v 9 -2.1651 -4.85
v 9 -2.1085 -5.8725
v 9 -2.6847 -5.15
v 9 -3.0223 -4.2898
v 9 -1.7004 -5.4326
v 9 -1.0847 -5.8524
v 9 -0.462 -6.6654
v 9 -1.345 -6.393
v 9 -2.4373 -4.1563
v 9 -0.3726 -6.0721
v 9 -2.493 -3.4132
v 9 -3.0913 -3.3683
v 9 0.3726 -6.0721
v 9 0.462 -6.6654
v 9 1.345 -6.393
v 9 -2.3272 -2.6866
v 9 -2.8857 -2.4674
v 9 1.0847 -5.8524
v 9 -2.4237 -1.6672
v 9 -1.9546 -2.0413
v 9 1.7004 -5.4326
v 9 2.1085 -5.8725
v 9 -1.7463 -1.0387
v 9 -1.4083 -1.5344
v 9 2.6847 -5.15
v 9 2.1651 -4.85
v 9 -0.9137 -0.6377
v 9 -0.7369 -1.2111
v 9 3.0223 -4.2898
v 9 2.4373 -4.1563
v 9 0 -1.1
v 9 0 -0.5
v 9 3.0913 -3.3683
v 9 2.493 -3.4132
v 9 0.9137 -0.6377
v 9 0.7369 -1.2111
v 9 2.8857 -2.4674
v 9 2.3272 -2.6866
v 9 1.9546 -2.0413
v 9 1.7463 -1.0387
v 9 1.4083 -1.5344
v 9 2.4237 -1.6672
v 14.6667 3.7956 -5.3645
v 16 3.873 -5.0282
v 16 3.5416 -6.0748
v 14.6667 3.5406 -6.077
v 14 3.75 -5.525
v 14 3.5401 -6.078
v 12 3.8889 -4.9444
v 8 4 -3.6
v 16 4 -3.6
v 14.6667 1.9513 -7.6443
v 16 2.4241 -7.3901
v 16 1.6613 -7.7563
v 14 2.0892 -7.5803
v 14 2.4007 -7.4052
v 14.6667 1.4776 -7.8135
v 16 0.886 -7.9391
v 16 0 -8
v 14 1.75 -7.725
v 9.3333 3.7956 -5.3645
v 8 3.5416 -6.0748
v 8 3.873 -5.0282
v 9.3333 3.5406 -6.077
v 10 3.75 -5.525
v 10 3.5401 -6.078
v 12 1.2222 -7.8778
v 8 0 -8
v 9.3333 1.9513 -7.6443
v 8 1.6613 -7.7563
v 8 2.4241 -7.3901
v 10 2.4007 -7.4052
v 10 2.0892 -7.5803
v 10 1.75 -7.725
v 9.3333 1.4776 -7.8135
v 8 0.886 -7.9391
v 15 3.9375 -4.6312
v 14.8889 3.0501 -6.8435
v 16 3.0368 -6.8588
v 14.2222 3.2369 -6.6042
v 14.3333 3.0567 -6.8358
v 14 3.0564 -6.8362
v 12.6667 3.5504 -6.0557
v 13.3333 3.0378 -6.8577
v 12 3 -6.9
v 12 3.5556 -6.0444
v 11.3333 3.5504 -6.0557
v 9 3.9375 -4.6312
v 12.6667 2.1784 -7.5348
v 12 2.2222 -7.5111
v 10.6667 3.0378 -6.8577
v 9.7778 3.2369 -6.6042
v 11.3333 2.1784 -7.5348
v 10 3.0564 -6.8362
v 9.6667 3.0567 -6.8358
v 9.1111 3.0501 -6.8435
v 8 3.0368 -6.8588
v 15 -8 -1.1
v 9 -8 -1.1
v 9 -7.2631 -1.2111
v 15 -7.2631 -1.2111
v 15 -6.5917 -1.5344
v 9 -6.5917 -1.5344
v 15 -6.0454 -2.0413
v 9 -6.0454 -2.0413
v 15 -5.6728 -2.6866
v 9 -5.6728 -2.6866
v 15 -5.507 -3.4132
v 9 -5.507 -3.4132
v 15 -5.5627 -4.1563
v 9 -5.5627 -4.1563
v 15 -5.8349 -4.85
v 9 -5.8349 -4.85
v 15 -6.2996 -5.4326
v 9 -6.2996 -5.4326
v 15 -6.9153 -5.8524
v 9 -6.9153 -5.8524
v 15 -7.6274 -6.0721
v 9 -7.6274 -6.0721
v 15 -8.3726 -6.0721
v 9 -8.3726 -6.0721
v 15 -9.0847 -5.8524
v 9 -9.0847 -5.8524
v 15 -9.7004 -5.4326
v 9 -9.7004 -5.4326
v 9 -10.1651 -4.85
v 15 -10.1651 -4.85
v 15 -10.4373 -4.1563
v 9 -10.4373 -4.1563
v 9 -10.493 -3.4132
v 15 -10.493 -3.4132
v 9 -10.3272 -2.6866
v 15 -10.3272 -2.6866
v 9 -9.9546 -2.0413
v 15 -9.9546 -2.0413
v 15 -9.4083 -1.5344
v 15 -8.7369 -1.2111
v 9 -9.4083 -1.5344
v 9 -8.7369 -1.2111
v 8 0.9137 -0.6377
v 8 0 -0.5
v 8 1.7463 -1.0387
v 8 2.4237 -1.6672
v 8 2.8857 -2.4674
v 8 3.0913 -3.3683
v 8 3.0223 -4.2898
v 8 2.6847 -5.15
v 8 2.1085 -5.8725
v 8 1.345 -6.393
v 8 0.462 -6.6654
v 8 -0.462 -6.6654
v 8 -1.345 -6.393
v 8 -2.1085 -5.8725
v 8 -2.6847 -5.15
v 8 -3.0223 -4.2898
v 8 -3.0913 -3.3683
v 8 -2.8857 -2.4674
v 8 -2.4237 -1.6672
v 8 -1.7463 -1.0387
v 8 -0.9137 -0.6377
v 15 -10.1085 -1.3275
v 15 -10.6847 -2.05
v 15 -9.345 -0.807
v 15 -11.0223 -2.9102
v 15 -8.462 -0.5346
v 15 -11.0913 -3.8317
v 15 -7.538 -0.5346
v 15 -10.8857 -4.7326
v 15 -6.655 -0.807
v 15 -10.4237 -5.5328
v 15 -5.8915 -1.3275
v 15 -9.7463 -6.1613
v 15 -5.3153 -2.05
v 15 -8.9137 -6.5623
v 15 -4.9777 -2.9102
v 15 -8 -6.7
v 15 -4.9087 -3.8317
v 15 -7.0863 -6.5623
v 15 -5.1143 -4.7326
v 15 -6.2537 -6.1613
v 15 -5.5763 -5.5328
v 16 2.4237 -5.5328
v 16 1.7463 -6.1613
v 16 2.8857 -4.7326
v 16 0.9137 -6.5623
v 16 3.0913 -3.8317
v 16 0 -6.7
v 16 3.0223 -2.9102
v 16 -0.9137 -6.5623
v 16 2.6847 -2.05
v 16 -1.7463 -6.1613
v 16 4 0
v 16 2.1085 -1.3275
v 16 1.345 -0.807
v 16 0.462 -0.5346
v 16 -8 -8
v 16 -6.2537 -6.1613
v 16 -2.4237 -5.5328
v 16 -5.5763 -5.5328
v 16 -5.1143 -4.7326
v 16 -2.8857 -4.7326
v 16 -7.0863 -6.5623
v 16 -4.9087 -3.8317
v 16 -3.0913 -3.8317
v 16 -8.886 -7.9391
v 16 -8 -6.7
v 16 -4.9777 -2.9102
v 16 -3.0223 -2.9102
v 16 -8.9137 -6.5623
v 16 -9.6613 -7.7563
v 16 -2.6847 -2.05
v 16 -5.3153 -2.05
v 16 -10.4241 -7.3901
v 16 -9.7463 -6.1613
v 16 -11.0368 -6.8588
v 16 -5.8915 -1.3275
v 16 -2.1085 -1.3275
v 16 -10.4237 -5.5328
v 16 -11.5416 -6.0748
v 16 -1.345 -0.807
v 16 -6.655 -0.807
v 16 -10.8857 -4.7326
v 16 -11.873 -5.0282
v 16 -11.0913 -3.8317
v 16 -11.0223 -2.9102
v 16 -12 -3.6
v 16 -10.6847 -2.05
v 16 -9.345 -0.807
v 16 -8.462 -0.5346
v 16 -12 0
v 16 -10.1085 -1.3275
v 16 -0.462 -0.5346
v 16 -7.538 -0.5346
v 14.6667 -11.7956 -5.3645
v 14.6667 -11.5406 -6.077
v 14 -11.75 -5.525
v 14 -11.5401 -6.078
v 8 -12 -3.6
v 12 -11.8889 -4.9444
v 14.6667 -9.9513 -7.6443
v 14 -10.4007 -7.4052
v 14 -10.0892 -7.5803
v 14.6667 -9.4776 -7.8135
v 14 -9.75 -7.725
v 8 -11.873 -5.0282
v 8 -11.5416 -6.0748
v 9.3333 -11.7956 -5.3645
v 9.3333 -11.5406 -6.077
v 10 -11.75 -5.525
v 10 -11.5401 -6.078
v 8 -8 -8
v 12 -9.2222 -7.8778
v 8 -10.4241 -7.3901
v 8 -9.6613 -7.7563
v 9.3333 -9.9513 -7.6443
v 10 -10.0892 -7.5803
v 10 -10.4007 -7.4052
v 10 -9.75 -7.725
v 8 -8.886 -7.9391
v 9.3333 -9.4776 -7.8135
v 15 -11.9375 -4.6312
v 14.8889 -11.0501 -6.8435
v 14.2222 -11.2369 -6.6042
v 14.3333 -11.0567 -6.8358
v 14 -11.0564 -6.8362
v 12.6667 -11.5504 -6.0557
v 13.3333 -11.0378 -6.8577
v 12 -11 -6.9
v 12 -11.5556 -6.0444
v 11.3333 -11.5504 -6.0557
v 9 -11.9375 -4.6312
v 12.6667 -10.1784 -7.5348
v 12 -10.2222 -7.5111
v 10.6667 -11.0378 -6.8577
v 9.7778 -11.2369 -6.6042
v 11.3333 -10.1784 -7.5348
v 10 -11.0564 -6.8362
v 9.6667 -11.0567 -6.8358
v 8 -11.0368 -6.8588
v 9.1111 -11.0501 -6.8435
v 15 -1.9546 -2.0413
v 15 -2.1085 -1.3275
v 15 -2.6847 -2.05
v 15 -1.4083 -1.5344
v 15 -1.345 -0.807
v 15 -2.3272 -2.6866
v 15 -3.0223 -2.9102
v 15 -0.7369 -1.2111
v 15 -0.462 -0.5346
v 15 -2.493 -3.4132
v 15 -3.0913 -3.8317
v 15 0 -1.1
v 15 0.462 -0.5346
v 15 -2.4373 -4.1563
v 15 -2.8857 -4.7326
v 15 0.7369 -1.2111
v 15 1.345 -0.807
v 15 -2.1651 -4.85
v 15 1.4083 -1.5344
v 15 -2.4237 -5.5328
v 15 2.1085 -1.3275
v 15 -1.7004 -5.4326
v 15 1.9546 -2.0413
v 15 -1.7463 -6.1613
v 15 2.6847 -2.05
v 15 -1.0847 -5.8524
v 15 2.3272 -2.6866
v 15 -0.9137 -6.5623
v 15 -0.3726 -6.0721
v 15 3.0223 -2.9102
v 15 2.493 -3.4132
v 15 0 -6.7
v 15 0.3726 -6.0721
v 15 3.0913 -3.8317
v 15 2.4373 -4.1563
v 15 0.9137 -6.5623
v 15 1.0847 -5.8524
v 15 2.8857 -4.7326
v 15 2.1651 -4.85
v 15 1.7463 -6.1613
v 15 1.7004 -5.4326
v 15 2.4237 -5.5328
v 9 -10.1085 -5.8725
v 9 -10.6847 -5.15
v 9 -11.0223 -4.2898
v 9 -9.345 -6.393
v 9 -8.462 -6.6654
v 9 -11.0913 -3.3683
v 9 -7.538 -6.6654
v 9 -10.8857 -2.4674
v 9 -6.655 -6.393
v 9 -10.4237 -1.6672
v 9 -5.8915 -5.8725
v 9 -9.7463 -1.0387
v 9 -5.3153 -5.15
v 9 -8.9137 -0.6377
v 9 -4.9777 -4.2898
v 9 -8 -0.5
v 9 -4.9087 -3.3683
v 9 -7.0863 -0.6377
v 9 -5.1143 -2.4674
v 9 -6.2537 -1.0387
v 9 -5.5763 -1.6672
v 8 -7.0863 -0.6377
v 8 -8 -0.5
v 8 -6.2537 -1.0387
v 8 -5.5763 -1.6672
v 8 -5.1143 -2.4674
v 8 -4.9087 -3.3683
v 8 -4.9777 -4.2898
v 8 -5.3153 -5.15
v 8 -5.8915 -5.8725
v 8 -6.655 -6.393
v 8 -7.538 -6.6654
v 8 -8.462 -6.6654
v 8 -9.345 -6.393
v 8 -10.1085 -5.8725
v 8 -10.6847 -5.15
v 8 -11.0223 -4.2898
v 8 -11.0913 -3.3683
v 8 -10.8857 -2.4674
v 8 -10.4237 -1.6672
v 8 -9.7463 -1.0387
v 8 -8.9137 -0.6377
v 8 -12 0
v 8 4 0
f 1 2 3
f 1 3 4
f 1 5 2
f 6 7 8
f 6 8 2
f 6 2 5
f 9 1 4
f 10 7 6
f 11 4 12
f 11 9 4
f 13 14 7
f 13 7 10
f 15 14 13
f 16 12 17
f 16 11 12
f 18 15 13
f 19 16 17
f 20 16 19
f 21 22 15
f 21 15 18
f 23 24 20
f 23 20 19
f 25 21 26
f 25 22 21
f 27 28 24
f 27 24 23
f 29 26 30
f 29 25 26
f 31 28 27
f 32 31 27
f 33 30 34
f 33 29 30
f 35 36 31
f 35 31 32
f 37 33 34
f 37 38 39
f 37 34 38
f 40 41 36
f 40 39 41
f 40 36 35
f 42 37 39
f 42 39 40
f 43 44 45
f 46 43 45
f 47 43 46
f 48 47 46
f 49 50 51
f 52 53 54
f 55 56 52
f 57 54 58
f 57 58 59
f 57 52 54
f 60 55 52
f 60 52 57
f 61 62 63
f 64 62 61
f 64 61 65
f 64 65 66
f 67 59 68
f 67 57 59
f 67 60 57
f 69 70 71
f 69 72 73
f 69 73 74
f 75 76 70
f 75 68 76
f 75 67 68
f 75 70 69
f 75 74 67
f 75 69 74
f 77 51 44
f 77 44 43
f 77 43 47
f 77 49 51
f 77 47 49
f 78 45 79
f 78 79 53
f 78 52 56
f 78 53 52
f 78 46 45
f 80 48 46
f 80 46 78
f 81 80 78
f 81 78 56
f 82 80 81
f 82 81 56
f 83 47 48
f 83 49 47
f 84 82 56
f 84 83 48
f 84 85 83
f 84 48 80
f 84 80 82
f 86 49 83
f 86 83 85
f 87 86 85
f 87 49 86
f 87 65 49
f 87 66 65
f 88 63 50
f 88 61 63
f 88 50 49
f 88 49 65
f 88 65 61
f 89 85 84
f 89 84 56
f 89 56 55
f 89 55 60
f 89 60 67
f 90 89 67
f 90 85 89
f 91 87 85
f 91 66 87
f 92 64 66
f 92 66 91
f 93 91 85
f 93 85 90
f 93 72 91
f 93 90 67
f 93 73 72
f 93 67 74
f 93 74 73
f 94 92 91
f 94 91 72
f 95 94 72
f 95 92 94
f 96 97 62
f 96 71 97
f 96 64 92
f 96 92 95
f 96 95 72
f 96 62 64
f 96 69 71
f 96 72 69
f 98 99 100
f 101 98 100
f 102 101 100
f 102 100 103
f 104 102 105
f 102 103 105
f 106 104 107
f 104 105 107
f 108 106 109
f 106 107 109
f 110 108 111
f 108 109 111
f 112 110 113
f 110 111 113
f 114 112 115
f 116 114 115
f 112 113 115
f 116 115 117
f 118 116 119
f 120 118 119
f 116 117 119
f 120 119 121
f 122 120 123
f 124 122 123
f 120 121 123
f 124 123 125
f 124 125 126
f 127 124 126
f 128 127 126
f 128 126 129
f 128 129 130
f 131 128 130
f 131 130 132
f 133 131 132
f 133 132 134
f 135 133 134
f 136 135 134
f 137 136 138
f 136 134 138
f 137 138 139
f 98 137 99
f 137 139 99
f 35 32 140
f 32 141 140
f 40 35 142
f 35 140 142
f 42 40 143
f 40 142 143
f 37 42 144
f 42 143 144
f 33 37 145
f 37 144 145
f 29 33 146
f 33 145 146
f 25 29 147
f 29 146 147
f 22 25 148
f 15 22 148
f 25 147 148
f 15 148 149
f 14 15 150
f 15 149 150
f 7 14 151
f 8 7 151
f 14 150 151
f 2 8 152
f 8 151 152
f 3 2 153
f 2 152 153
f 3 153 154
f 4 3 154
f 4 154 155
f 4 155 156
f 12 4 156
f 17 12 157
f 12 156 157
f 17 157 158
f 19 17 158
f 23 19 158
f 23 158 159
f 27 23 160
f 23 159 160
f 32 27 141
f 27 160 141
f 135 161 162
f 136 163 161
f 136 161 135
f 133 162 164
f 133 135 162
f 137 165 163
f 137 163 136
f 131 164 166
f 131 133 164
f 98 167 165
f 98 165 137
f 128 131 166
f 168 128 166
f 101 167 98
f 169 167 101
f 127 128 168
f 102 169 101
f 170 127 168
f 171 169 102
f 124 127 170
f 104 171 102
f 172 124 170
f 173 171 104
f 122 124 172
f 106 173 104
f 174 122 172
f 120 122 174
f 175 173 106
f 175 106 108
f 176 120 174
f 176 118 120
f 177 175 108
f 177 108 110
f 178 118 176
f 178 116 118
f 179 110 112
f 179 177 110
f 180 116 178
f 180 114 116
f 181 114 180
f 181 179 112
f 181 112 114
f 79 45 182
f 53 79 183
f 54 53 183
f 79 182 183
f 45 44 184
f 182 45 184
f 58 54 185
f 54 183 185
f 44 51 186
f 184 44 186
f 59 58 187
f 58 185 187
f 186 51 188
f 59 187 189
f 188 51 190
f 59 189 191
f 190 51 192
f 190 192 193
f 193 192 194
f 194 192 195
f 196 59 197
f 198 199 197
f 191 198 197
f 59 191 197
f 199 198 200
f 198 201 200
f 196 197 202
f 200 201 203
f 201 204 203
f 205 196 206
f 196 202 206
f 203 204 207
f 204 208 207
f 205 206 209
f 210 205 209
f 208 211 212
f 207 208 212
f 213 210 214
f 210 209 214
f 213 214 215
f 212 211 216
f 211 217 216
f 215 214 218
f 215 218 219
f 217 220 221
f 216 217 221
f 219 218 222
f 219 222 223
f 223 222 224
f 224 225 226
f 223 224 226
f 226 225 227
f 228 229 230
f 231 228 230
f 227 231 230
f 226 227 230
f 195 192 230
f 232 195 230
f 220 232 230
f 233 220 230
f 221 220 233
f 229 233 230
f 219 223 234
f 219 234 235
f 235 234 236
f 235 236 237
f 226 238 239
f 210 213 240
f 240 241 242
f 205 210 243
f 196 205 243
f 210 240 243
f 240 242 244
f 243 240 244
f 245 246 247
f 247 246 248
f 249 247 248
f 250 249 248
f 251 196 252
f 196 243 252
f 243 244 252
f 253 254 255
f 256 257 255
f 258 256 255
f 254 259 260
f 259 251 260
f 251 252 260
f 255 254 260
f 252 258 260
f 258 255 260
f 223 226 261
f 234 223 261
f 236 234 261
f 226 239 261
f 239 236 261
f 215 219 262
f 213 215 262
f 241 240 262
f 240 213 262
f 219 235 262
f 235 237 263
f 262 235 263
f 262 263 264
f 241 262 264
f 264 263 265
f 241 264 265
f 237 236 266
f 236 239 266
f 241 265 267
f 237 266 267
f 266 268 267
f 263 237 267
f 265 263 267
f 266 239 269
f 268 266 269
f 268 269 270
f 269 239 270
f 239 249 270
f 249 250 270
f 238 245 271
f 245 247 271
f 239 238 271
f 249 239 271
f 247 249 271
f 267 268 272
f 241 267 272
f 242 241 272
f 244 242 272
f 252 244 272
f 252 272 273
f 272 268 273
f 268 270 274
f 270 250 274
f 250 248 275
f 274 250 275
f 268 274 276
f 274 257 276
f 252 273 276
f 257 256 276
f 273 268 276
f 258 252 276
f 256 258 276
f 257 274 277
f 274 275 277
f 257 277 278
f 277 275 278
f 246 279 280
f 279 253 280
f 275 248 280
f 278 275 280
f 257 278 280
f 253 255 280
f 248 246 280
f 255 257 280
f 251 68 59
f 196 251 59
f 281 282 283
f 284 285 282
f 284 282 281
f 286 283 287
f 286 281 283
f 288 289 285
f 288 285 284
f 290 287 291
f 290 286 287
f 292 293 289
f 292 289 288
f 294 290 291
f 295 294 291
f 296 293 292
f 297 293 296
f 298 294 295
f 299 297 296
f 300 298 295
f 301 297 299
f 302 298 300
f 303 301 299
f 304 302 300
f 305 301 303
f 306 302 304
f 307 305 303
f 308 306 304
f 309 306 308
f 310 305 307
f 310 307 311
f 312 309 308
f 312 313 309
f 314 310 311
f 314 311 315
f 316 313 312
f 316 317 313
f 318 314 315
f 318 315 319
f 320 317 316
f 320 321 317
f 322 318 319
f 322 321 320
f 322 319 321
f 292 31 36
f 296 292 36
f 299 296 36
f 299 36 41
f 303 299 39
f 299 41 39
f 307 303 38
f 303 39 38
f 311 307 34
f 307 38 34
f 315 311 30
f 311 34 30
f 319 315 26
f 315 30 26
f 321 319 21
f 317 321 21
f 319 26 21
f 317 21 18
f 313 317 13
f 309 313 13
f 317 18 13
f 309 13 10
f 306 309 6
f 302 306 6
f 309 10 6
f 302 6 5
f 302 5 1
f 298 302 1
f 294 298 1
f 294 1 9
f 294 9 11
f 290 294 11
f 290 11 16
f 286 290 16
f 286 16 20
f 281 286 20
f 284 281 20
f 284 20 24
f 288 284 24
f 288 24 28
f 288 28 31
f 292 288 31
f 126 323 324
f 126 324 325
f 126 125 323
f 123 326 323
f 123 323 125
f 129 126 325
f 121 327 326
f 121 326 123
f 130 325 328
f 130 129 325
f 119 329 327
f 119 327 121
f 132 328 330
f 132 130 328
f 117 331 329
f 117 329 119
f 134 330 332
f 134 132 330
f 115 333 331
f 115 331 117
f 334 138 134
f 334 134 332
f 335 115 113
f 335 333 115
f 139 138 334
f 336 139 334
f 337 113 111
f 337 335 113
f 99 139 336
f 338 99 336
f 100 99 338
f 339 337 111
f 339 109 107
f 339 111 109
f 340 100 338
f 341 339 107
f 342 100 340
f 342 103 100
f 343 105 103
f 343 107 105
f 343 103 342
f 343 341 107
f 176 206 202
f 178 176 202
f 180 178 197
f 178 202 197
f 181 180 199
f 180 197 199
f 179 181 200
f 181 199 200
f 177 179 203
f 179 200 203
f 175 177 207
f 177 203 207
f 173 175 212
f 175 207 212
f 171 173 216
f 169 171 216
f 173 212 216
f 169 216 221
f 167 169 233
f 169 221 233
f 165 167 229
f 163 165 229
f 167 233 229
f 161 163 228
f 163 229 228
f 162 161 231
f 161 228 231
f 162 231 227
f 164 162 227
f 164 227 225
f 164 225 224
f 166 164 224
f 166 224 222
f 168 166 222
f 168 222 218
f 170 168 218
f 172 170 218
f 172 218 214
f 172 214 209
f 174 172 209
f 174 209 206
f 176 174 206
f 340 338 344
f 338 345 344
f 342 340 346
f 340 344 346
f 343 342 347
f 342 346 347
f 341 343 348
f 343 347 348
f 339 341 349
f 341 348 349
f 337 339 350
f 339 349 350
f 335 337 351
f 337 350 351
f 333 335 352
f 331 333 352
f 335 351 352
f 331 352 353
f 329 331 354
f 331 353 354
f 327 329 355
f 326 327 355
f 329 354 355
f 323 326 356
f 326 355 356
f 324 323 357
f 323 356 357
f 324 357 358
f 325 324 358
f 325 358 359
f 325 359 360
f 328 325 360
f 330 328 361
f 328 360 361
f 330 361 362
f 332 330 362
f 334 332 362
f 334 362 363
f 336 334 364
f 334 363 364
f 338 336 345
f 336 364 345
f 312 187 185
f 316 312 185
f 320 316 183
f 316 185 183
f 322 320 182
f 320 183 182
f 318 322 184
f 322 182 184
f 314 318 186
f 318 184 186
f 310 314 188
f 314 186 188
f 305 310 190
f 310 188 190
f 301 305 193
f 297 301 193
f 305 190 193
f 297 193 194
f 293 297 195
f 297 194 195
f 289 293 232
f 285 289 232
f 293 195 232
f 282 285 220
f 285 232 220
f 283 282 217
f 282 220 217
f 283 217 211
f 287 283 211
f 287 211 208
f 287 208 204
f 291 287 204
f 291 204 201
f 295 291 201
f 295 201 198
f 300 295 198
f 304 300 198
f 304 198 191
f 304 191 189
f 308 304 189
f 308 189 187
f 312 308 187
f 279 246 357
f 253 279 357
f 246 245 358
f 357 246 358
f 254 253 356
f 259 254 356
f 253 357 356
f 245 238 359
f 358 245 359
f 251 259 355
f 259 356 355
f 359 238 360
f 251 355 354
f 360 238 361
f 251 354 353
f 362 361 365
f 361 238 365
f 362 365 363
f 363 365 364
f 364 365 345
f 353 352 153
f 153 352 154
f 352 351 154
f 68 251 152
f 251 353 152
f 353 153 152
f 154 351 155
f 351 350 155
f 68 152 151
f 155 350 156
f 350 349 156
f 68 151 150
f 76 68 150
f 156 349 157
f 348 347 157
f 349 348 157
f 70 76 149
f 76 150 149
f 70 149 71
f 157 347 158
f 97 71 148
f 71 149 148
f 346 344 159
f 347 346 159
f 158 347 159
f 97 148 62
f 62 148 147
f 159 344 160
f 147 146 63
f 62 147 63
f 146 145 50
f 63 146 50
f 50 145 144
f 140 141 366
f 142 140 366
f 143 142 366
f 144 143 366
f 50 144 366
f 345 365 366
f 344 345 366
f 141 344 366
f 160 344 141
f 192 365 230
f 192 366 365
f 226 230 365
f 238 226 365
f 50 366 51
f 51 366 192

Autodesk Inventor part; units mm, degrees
ref_plane "YZ Plane" through (0, 0, 0) normal (1, 0, 0) x (0, 1, 0)
ref_plane "XZ Plane" through (0, 0, 0) normal (0, 1, 0) x (-1, 0, 0)
ref_plane "XY Plane" through (0, 0, 0) normal (0, 0, 1) x (1, 0, 0)
sketch "Esboço1" plane through (0, 0, 0) normal (0, 0, 1) x (1, 0, 0)
  line L0 (16, -12) -> (8, -12)
  line L1 (8, -12) -> (8, 4)
  line L2 (8, 4) -> (16, 4)
  line L3 (16, 4) -> (16, -12)
  point P0 (0, 0)
  dimension "d0" = 8
  dimension "d1" = 16
extrude "Extrusão1" add sketch "Esboço1" against normal blind 8
sketch "Esboço3" plane through (8, -12, 0) normal (-1, 0, 0) x (0, 0, 1)
  circle A0 centre (-3.6, 4) radius 2.4 projected
  circle A1 centre (-3.6, 12) radius 2.4 projected
  line L0 (0, 0) -> (-8, 0) projected
  line L1 (-3.6, 0) -> (-8, 0) construction
  line L2 (-8, 16) -> (-8, 0) projected
  line L3 (-8, 0) -> (-8, 4) construction
  spline S0 degree 2 poles (-3.6, 0) (-8, 0) (-8, 4) knots 1 1 1 2 2 2
  line L4 (0, 16) -> (-8, 16) projected
  line L5 (-3.6, 16) -> (-8, 16) construction
  line L6 (-8, 16) -> (-8, 12) construction
  spline S1 degree 2 poles (-3.6, 16) (-8, 16) (-8, 12) knots 1 1 1 2 2 2
  circle A2 centre (-3.6, 12) radius 2.5
  circle A3 centre (-3.6, 4) radius 2.5
  point P0 (0, 12)
  dimension "d14" = 5
  dimension "d15" = 5
extrude "Extrusão3" cut sketch "Esboço3" against normal blind 8 contours A0 | A1 | L2 L4 S1 | L0 L2 S0 | A2 | A3
sketch "Esboço4" plane through (8, -12, 0) normal (-1, 0, 0) x (0, 0, 1)
  circle A0 centre (-3.6, 12) radius 3.1 projected
  circle A1 centre (-3.6, 4) radius 3.1 projected
  point P0 (0, 12)
extrude "Extrusão4" cut sketch "Esboço4" against normal blind 1
sketch "Esboço5" plane through (16, -12, 0) normal (1, 0, 0) x (0, 0, -1)
  circle A0 centre (3.6, 12) radius 3.1 projected
  circle A1 centre (3.6, 4) radius 3.1 projected
  point P0 (0, 12)
extrude "Extrusão5" cut sketch "Esboço5" against normal blind 1
properties part number "_3DPrint"
